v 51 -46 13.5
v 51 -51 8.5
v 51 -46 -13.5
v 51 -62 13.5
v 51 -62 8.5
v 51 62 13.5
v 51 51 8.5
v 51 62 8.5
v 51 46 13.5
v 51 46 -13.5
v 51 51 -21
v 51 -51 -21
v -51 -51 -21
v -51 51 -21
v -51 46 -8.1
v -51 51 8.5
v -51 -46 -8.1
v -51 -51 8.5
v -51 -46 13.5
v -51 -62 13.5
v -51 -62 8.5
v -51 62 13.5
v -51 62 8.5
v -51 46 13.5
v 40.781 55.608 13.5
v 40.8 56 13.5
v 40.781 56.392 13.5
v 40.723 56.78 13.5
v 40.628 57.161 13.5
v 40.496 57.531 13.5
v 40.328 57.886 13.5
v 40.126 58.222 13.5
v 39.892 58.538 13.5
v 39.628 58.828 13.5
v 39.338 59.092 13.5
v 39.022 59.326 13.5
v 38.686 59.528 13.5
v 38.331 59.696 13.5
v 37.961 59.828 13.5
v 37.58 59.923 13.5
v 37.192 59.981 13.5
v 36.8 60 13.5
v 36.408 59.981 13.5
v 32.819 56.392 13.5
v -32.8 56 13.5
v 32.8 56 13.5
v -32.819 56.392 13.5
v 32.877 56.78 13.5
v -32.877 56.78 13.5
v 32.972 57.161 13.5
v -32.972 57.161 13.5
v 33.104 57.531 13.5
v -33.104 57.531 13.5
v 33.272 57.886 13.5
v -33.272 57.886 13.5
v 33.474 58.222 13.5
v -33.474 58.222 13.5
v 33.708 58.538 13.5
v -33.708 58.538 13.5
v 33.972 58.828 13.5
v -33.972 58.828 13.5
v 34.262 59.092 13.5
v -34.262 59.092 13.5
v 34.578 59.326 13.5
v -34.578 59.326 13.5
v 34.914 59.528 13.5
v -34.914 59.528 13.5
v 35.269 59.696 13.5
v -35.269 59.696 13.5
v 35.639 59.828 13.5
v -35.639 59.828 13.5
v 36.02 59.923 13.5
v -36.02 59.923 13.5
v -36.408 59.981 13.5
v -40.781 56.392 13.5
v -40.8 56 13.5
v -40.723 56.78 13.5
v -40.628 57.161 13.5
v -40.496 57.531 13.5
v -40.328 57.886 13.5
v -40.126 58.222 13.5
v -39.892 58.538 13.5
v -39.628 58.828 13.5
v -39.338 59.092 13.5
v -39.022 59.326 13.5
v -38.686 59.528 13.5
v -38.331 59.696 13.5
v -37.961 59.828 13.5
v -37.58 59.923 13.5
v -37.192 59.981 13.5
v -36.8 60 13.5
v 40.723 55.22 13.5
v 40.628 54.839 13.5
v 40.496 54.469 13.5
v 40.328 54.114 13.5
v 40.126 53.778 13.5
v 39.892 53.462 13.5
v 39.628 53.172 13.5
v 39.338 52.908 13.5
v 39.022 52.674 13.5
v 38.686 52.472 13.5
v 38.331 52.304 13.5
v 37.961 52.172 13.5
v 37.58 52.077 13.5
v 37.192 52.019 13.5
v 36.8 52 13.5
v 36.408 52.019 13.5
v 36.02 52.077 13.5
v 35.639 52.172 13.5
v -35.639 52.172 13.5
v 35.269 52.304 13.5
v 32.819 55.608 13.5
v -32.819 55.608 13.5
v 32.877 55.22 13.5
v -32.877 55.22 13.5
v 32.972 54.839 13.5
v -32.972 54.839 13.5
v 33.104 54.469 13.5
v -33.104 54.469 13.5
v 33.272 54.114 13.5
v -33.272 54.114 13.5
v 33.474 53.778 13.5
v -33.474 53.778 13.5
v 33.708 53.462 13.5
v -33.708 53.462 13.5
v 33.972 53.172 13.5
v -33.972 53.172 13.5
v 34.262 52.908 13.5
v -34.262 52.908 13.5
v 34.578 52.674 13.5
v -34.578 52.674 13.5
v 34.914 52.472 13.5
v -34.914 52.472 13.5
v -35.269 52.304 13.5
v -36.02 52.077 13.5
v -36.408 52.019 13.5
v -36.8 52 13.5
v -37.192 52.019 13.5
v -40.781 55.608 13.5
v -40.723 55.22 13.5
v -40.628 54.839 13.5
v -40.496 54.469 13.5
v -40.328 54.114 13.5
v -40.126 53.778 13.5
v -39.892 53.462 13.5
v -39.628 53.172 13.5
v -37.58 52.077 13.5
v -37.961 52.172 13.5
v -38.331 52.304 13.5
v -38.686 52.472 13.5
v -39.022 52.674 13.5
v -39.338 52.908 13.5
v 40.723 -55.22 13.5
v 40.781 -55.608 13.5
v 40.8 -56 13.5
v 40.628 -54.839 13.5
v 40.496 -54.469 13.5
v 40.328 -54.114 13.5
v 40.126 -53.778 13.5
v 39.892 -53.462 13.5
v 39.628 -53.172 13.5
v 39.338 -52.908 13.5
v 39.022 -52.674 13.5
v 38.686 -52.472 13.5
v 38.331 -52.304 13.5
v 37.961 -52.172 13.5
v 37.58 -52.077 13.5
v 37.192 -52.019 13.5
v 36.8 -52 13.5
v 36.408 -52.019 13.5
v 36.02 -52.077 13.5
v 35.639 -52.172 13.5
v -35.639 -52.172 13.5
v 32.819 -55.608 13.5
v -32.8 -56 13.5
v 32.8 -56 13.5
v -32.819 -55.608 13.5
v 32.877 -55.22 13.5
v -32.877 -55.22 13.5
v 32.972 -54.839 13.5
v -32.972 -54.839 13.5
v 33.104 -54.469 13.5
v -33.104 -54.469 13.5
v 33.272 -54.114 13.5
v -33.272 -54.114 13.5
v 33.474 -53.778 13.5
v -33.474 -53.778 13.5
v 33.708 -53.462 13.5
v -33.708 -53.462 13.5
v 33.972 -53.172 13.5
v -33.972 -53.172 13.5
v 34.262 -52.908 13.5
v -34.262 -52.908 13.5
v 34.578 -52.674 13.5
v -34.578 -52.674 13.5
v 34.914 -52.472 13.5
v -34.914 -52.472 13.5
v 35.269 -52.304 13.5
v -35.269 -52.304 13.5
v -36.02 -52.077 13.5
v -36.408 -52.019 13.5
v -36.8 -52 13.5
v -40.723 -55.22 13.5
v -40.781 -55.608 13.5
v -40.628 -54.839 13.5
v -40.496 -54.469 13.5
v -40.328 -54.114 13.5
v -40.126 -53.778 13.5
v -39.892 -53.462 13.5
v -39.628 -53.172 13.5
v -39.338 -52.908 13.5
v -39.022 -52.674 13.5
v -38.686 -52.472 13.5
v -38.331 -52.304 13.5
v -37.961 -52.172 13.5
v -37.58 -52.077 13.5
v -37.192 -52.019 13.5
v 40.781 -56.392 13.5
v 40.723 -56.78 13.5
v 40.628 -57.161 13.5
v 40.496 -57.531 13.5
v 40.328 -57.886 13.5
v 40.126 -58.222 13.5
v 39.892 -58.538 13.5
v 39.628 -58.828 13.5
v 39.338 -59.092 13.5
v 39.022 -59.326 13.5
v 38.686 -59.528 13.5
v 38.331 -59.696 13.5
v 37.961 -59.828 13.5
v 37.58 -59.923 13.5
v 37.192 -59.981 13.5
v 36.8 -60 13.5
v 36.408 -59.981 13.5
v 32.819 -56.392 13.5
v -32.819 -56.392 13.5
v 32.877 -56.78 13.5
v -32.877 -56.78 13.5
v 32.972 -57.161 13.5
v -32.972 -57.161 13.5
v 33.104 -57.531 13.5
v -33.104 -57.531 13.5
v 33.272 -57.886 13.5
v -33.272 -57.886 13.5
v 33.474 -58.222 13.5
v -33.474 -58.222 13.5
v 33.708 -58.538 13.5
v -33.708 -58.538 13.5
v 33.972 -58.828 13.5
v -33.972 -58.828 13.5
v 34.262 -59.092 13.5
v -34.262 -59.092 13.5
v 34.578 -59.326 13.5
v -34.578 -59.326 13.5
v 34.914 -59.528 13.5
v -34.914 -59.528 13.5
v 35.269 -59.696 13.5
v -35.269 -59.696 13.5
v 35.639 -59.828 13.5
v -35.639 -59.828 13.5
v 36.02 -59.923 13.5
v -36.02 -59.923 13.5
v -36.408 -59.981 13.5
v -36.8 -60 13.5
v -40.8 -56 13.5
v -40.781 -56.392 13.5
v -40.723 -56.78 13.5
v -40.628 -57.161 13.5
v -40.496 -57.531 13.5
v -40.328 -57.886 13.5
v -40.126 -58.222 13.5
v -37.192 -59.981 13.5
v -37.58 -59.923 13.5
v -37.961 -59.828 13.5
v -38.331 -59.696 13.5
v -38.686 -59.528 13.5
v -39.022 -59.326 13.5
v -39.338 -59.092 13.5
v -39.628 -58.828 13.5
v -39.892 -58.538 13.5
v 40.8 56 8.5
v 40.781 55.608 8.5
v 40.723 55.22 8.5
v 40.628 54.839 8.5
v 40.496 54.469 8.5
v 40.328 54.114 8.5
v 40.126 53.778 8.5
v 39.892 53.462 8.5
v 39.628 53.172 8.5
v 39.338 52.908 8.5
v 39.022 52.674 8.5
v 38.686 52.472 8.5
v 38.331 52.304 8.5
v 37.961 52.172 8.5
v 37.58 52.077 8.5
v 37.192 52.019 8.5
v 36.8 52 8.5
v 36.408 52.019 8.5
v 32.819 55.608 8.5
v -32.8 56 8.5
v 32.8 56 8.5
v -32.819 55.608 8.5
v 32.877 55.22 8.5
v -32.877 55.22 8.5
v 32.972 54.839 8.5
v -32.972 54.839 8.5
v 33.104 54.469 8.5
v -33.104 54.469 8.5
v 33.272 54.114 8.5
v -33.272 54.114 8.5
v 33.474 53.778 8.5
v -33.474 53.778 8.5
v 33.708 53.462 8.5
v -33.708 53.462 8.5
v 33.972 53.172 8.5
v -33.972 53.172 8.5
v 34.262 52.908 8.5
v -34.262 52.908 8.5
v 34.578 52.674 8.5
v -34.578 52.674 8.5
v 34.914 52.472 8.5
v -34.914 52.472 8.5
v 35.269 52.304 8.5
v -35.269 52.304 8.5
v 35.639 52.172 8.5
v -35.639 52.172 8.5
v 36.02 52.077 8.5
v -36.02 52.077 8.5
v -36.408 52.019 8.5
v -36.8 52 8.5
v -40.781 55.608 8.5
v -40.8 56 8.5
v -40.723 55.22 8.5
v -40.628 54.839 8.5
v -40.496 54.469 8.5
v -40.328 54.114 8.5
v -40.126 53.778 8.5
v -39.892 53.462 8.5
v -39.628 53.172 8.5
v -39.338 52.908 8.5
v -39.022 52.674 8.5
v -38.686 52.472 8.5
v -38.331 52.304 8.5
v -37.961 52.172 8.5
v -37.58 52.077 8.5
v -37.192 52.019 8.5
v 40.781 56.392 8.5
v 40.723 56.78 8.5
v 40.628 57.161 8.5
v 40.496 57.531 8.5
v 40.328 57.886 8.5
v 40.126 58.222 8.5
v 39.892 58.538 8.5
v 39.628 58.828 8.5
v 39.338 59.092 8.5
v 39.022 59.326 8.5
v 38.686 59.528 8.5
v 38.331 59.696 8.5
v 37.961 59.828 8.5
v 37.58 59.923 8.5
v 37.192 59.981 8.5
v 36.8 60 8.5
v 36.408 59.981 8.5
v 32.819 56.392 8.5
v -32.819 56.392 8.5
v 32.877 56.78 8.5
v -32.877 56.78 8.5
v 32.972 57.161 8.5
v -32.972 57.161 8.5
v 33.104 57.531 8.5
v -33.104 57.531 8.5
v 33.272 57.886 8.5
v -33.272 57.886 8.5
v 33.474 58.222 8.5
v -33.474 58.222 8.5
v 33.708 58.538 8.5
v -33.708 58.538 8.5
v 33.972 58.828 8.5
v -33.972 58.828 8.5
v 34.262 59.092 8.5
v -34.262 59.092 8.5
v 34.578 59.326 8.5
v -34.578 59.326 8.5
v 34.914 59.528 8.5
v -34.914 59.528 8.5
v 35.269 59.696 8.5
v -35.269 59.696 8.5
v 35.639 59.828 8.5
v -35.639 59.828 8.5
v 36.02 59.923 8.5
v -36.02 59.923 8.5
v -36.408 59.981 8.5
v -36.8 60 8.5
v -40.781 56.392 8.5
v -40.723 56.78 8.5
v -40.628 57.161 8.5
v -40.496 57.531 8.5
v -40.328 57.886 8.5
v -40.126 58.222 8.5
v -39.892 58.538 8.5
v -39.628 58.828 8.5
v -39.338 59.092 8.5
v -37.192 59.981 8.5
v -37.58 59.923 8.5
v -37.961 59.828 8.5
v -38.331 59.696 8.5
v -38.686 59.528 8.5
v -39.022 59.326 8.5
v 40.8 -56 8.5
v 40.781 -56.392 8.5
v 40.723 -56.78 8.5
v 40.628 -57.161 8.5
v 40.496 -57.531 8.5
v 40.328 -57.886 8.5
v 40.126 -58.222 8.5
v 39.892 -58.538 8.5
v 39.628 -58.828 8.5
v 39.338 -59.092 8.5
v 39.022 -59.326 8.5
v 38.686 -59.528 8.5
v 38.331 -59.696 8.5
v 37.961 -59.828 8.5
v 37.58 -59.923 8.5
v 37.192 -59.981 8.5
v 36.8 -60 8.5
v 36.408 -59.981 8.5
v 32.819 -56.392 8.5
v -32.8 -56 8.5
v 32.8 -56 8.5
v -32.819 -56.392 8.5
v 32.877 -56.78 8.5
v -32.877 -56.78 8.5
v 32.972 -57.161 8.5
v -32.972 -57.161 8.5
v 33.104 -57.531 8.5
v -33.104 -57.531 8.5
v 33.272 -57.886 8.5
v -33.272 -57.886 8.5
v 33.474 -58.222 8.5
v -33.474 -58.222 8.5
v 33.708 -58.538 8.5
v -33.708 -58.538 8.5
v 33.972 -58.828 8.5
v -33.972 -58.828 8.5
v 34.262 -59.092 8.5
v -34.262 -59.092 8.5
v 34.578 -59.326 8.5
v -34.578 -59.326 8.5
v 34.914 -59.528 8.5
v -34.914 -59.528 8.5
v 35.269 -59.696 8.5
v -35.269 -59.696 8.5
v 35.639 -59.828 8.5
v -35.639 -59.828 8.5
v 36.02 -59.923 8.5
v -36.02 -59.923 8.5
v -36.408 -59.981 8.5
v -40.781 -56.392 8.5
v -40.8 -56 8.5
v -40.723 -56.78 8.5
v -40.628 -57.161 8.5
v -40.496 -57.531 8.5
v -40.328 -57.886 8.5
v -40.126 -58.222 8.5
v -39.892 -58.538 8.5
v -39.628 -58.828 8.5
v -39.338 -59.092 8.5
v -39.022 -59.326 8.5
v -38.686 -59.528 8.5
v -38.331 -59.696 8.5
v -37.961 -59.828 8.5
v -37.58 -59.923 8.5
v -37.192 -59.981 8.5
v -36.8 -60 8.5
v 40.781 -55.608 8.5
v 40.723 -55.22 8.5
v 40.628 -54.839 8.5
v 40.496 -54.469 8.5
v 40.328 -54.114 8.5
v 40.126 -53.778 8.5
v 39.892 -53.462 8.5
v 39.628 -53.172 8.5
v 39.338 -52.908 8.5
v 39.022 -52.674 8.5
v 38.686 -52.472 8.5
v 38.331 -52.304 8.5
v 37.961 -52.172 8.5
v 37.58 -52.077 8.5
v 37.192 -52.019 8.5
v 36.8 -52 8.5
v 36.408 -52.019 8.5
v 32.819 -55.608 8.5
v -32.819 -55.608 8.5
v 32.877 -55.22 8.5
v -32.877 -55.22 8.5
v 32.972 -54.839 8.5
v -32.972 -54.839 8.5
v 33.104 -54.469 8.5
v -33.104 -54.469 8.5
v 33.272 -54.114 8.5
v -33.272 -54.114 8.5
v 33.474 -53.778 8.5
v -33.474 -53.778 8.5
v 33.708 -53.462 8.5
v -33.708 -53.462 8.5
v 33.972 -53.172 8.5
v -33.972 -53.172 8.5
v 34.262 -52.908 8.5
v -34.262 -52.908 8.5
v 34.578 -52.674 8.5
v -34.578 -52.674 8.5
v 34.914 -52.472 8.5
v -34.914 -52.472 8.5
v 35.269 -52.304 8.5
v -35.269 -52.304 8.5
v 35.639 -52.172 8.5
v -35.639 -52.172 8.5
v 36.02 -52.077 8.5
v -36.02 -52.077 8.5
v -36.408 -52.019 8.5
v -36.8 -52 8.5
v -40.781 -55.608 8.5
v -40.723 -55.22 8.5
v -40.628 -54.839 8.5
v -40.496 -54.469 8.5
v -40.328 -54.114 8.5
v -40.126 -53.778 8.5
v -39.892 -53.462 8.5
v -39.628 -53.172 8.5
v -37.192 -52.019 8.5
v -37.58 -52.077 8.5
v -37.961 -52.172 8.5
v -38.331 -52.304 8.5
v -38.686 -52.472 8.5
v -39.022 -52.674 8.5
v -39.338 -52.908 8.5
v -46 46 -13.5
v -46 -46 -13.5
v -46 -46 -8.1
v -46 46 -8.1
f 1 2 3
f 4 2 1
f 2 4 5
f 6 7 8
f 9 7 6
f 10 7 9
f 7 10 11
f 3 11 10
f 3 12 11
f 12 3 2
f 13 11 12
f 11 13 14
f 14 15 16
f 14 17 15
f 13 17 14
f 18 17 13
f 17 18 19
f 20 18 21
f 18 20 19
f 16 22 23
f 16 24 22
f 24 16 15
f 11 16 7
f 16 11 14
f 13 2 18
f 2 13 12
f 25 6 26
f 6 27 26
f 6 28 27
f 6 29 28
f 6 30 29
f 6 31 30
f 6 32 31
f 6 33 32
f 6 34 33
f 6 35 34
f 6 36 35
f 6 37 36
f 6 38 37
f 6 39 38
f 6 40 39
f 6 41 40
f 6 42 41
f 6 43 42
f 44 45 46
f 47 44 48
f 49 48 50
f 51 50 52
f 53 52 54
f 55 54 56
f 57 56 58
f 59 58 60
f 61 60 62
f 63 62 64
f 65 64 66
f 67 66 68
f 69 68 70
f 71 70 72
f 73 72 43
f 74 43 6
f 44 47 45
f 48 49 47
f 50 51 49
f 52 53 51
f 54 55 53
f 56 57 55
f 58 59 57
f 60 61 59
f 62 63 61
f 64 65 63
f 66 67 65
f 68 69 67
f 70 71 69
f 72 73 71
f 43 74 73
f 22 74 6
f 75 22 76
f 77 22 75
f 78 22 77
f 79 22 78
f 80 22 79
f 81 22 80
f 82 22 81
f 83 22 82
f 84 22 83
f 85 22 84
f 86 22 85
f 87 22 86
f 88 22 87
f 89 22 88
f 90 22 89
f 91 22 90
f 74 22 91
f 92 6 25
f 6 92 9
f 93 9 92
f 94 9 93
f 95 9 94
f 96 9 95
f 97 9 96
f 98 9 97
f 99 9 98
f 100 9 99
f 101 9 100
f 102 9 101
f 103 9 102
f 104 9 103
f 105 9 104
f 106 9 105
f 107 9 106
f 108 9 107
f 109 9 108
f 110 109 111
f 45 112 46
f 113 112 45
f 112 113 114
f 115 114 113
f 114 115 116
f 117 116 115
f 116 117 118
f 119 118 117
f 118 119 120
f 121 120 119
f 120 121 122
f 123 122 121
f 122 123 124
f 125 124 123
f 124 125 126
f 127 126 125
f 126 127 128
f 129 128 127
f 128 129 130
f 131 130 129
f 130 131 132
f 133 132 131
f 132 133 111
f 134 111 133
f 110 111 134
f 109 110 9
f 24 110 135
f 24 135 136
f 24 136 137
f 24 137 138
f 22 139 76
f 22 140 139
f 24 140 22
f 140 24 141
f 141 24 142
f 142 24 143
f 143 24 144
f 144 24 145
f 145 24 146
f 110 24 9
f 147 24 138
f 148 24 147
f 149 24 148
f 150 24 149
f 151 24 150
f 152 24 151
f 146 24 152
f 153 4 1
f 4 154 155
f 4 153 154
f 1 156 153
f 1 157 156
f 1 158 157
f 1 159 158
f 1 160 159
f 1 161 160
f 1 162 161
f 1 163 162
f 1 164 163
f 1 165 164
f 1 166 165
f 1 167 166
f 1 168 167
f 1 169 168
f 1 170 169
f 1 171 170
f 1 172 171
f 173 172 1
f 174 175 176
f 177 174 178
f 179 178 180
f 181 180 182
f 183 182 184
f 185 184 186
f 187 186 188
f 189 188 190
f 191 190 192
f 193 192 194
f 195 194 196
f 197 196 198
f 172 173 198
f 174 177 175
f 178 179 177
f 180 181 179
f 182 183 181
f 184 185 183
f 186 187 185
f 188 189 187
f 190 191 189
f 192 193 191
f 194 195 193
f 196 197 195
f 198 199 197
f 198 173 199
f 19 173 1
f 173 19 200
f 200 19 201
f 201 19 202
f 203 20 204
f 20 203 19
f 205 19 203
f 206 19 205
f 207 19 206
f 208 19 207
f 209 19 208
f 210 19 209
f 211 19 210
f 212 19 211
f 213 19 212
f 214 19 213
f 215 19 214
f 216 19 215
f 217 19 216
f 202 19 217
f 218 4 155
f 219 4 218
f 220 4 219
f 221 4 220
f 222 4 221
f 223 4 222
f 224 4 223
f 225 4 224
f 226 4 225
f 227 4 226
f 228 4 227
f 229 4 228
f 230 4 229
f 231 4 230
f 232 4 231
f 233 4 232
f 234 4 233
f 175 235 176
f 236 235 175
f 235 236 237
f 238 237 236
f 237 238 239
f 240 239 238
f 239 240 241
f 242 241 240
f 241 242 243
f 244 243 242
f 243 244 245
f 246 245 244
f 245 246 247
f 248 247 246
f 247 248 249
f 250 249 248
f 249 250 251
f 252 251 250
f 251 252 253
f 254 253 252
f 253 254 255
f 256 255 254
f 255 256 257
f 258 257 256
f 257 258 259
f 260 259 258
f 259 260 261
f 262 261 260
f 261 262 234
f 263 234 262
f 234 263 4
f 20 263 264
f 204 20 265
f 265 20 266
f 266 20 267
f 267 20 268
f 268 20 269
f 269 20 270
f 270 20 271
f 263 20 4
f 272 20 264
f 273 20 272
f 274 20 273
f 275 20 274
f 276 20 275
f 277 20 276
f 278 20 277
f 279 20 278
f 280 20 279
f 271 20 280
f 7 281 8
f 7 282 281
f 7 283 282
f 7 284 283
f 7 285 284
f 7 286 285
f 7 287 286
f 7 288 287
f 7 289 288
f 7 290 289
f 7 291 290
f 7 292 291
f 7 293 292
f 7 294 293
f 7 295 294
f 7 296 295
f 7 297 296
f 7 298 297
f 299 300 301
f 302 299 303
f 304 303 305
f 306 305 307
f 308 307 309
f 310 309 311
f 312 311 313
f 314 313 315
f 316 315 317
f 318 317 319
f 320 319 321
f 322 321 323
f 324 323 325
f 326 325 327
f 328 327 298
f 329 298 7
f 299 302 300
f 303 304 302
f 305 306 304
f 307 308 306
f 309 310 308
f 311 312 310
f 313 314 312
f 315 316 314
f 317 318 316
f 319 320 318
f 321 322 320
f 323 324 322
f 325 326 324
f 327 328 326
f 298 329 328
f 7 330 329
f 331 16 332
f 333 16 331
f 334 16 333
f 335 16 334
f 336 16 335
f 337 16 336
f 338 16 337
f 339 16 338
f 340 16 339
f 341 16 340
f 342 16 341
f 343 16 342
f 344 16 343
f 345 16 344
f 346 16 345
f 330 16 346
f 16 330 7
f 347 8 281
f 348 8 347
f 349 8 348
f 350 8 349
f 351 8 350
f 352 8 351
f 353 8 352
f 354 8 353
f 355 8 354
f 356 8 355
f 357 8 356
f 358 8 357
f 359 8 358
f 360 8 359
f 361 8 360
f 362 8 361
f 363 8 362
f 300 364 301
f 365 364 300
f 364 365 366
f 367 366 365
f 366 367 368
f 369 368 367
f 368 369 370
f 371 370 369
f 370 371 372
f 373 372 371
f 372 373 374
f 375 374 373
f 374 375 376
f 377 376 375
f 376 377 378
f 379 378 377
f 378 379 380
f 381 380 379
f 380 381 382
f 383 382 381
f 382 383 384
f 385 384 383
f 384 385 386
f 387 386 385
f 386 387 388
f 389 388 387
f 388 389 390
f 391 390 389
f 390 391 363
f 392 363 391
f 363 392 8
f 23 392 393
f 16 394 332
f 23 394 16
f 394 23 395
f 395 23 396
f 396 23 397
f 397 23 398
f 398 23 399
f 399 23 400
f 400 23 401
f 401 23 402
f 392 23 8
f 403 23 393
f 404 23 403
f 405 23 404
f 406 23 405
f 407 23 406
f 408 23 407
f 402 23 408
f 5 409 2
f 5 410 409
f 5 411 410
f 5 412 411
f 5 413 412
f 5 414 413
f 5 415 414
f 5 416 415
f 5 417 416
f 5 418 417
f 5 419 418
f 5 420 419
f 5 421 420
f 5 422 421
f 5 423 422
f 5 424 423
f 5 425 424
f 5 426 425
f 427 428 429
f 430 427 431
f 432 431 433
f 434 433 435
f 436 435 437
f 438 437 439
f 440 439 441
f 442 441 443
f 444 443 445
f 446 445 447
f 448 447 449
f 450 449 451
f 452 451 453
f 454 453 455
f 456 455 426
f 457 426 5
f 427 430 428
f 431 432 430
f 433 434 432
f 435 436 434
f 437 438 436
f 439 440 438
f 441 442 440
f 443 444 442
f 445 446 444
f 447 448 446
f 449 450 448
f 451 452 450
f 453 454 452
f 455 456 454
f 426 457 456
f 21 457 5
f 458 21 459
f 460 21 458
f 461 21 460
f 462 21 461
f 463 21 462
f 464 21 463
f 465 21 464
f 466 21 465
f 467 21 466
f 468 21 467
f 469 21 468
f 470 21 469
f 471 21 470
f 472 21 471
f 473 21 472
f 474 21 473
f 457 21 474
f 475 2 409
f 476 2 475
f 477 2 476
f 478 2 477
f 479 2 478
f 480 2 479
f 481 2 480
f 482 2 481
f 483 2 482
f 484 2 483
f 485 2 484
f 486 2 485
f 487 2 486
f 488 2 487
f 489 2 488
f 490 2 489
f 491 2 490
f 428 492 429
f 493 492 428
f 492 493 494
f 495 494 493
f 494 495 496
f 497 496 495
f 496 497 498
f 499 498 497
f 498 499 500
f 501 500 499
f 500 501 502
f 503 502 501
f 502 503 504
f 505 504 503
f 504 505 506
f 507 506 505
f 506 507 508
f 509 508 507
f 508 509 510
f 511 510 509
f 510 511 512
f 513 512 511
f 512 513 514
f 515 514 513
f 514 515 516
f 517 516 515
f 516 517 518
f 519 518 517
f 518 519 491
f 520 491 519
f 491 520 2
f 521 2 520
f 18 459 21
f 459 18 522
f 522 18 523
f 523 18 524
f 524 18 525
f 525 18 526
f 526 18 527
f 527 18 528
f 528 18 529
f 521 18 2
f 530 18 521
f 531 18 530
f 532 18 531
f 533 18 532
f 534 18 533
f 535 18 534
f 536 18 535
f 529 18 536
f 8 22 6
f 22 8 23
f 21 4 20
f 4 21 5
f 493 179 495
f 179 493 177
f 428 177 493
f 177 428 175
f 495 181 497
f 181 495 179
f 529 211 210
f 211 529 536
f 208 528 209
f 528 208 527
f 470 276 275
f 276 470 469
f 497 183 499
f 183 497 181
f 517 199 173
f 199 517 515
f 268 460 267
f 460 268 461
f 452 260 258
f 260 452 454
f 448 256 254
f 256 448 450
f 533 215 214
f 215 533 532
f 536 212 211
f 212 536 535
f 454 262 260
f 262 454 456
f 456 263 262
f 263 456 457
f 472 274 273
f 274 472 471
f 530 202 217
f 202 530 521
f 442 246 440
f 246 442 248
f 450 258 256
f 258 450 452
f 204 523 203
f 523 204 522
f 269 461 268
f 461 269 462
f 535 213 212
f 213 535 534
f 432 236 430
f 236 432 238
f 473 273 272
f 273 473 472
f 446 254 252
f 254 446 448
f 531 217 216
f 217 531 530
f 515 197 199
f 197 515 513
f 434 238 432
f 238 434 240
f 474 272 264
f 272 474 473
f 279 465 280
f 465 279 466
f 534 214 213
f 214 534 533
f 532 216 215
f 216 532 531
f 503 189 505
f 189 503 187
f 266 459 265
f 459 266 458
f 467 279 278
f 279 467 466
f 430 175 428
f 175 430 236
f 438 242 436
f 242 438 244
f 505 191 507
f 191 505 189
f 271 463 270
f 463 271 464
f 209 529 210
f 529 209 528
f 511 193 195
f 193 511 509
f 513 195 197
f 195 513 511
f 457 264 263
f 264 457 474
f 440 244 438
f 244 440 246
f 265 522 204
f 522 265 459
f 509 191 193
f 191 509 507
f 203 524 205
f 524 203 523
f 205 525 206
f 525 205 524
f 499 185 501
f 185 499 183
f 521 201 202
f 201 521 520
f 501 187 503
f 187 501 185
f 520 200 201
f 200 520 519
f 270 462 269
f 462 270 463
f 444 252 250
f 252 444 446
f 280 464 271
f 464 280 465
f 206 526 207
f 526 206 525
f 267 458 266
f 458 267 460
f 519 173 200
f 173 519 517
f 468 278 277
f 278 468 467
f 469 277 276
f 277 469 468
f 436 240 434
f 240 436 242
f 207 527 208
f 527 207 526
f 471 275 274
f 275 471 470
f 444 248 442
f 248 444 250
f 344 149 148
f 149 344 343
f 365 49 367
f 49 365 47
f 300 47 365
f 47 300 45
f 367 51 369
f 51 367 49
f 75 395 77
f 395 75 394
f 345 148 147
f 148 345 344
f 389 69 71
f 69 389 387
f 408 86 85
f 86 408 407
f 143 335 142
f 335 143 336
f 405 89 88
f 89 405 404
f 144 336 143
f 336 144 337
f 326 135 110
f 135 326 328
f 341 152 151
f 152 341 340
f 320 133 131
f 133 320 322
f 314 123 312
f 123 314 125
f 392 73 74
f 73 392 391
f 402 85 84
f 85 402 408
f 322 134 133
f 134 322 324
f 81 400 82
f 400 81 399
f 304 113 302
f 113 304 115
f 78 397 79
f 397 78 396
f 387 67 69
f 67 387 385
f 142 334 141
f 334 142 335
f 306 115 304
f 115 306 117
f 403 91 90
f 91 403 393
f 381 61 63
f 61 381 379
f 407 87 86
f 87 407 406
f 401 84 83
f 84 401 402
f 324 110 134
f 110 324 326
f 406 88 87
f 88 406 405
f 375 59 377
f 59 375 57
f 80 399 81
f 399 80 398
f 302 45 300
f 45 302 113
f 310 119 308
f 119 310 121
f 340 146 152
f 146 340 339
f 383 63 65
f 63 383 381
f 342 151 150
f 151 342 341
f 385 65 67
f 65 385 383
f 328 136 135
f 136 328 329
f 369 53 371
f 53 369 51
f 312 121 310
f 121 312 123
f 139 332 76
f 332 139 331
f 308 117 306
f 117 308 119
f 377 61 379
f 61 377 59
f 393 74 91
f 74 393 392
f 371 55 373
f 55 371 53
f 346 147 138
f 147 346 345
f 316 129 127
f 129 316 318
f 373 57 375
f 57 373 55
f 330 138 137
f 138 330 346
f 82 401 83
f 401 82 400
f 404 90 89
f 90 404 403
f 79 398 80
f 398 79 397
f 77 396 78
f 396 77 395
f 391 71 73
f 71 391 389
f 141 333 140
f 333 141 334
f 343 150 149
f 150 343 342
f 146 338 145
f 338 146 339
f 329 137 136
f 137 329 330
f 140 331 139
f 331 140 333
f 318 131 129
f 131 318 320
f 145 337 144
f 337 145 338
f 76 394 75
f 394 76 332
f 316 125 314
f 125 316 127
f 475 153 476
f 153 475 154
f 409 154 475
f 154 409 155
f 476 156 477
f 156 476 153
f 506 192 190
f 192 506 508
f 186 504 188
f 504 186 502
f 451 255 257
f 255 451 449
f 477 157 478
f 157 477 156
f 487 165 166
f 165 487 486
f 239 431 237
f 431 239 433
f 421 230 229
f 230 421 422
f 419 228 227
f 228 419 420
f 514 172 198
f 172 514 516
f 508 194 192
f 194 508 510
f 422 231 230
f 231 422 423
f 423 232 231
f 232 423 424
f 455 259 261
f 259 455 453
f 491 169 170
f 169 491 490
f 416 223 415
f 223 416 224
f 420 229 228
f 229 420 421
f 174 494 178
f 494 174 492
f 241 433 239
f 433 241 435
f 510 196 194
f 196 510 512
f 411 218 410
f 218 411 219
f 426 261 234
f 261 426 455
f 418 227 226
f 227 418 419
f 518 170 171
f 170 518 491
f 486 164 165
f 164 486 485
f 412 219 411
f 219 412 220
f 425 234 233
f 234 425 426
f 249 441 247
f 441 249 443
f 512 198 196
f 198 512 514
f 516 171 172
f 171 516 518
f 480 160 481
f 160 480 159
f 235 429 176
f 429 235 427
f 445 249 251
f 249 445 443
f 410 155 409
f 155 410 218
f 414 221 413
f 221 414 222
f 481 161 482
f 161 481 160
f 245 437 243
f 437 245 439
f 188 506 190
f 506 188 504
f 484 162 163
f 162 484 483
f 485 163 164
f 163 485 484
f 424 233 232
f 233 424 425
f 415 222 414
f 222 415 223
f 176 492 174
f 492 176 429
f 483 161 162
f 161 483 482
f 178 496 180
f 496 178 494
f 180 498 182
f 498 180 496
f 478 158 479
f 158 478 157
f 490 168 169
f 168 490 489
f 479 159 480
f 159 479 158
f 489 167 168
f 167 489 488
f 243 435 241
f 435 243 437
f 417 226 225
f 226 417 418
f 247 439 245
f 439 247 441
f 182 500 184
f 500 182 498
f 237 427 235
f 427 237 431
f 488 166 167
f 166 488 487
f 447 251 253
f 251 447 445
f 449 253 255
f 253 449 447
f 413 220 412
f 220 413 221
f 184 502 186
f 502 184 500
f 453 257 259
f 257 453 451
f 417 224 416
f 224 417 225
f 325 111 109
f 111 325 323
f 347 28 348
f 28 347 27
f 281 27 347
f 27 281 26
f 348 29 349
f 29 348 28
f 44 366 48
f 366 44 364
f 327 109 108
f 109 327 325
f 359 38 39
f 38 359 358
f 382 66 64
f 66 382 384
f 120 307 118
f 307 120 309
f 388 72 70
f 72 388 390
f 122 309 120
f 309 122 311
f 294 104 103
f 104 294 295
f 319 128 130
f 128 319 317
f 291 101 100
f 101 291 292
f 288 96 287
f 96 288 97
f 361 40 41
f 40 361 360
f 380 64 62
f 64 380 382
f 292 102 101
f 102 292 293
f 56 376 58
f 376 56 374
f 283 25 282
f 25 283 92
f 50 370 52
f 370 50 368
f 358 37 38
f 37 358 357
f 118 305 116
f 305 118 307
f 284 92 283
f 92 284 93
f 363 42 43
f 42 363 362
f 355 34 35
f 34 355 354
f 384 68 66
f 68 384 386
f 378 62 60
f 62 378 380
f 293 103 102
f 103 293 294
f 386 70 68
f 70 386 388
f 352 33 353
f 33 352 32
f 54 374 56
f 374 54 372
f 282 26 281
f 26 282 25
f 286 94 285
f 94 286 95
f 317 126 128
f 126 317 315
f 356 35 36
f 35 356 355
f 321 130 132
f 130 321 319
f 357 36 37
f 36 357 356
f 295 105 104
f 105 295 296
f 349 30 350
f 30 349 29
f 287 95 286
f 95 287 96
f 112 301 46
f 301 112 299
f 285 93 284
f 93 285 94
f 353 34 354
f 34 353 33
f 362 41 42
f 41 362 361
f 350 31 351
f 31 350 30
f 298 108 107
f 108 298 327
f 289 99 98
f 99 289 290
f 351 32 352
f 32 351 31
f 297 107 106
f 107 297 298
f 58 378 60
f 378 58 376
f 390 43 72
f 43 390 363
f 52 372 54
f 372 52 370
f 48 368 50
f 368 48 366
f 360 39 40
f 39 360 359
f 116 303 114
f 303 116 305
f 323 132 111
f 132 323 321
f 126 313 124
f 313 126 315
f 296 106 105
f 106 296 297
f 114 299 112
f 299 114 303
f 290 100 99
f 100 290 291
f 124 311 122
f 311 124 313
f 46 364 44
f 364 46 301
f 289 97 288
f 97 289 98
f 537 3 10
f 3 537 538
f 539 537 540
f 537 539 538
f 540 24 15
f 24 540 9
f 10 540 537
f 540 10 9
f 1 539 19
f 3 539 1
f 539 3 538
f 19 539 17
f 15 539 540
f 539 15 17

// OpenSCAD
// Box holder for table

// https://openscad.org/cheatsheet/

// Object parameters
w = 92;
l = 92;
h = 27;
error = 0; // mm to add to account for print error
wall_width = 10;
screw_hole_r = 4;






// Change quality 
$fn = 64;
object_size = [w,l,h];

module inside_cube(object_size)
{
    cube(object_size,true);
}

module wall_cube(object_size, wall_w, screw_hole_r)
{
     connector_width = 5;
     cube_size_addition = [wall_w,wall_w, 0];
     
     union() {
         translate([0,0,-wall_w/2]) cube(object_size + cube_size_addition + [0,0, wall_w / 2], true);
         translate([0,0,object_size[2]/2 - connector_width/2]) cube([object_size[0], object_size[1] + screw_hole_r*3 +wall_w, connector_width] + cube_size_addition , true);
     }
}

module holes(hole_distance, screw_hole_r)
{
    translate([0, -hole_distance/2, 0]) cylinder(h=100, r=screw_hole_r, center=false);
    translate([0, hole_distance/2, 0]) cylinder(h=100, r=screw_hole_r, center=false);
    
}

difference()
{
    wall_cube(object_size, wall_width, screw_hole_r);
    inside_cube(object_size * (error + 1));
    
    translate([0,0,object_size[2]/5]) inside_cube(object_size + [2*wall_width, 0, 0 ]);
    translate([object_size[1]/2,0,0]) inside_cube(object_size + [2*wall_width, 0, 0 ]);
    
    translate([-object_size[1]/2.5,0,0]) holes(object_size[0] + wall_width*2, screw_hole_r);
    translate([object_size[1]/2.5,0,0]) holes(object_size[0] + wall_width*2, screw_hole_r);
}
